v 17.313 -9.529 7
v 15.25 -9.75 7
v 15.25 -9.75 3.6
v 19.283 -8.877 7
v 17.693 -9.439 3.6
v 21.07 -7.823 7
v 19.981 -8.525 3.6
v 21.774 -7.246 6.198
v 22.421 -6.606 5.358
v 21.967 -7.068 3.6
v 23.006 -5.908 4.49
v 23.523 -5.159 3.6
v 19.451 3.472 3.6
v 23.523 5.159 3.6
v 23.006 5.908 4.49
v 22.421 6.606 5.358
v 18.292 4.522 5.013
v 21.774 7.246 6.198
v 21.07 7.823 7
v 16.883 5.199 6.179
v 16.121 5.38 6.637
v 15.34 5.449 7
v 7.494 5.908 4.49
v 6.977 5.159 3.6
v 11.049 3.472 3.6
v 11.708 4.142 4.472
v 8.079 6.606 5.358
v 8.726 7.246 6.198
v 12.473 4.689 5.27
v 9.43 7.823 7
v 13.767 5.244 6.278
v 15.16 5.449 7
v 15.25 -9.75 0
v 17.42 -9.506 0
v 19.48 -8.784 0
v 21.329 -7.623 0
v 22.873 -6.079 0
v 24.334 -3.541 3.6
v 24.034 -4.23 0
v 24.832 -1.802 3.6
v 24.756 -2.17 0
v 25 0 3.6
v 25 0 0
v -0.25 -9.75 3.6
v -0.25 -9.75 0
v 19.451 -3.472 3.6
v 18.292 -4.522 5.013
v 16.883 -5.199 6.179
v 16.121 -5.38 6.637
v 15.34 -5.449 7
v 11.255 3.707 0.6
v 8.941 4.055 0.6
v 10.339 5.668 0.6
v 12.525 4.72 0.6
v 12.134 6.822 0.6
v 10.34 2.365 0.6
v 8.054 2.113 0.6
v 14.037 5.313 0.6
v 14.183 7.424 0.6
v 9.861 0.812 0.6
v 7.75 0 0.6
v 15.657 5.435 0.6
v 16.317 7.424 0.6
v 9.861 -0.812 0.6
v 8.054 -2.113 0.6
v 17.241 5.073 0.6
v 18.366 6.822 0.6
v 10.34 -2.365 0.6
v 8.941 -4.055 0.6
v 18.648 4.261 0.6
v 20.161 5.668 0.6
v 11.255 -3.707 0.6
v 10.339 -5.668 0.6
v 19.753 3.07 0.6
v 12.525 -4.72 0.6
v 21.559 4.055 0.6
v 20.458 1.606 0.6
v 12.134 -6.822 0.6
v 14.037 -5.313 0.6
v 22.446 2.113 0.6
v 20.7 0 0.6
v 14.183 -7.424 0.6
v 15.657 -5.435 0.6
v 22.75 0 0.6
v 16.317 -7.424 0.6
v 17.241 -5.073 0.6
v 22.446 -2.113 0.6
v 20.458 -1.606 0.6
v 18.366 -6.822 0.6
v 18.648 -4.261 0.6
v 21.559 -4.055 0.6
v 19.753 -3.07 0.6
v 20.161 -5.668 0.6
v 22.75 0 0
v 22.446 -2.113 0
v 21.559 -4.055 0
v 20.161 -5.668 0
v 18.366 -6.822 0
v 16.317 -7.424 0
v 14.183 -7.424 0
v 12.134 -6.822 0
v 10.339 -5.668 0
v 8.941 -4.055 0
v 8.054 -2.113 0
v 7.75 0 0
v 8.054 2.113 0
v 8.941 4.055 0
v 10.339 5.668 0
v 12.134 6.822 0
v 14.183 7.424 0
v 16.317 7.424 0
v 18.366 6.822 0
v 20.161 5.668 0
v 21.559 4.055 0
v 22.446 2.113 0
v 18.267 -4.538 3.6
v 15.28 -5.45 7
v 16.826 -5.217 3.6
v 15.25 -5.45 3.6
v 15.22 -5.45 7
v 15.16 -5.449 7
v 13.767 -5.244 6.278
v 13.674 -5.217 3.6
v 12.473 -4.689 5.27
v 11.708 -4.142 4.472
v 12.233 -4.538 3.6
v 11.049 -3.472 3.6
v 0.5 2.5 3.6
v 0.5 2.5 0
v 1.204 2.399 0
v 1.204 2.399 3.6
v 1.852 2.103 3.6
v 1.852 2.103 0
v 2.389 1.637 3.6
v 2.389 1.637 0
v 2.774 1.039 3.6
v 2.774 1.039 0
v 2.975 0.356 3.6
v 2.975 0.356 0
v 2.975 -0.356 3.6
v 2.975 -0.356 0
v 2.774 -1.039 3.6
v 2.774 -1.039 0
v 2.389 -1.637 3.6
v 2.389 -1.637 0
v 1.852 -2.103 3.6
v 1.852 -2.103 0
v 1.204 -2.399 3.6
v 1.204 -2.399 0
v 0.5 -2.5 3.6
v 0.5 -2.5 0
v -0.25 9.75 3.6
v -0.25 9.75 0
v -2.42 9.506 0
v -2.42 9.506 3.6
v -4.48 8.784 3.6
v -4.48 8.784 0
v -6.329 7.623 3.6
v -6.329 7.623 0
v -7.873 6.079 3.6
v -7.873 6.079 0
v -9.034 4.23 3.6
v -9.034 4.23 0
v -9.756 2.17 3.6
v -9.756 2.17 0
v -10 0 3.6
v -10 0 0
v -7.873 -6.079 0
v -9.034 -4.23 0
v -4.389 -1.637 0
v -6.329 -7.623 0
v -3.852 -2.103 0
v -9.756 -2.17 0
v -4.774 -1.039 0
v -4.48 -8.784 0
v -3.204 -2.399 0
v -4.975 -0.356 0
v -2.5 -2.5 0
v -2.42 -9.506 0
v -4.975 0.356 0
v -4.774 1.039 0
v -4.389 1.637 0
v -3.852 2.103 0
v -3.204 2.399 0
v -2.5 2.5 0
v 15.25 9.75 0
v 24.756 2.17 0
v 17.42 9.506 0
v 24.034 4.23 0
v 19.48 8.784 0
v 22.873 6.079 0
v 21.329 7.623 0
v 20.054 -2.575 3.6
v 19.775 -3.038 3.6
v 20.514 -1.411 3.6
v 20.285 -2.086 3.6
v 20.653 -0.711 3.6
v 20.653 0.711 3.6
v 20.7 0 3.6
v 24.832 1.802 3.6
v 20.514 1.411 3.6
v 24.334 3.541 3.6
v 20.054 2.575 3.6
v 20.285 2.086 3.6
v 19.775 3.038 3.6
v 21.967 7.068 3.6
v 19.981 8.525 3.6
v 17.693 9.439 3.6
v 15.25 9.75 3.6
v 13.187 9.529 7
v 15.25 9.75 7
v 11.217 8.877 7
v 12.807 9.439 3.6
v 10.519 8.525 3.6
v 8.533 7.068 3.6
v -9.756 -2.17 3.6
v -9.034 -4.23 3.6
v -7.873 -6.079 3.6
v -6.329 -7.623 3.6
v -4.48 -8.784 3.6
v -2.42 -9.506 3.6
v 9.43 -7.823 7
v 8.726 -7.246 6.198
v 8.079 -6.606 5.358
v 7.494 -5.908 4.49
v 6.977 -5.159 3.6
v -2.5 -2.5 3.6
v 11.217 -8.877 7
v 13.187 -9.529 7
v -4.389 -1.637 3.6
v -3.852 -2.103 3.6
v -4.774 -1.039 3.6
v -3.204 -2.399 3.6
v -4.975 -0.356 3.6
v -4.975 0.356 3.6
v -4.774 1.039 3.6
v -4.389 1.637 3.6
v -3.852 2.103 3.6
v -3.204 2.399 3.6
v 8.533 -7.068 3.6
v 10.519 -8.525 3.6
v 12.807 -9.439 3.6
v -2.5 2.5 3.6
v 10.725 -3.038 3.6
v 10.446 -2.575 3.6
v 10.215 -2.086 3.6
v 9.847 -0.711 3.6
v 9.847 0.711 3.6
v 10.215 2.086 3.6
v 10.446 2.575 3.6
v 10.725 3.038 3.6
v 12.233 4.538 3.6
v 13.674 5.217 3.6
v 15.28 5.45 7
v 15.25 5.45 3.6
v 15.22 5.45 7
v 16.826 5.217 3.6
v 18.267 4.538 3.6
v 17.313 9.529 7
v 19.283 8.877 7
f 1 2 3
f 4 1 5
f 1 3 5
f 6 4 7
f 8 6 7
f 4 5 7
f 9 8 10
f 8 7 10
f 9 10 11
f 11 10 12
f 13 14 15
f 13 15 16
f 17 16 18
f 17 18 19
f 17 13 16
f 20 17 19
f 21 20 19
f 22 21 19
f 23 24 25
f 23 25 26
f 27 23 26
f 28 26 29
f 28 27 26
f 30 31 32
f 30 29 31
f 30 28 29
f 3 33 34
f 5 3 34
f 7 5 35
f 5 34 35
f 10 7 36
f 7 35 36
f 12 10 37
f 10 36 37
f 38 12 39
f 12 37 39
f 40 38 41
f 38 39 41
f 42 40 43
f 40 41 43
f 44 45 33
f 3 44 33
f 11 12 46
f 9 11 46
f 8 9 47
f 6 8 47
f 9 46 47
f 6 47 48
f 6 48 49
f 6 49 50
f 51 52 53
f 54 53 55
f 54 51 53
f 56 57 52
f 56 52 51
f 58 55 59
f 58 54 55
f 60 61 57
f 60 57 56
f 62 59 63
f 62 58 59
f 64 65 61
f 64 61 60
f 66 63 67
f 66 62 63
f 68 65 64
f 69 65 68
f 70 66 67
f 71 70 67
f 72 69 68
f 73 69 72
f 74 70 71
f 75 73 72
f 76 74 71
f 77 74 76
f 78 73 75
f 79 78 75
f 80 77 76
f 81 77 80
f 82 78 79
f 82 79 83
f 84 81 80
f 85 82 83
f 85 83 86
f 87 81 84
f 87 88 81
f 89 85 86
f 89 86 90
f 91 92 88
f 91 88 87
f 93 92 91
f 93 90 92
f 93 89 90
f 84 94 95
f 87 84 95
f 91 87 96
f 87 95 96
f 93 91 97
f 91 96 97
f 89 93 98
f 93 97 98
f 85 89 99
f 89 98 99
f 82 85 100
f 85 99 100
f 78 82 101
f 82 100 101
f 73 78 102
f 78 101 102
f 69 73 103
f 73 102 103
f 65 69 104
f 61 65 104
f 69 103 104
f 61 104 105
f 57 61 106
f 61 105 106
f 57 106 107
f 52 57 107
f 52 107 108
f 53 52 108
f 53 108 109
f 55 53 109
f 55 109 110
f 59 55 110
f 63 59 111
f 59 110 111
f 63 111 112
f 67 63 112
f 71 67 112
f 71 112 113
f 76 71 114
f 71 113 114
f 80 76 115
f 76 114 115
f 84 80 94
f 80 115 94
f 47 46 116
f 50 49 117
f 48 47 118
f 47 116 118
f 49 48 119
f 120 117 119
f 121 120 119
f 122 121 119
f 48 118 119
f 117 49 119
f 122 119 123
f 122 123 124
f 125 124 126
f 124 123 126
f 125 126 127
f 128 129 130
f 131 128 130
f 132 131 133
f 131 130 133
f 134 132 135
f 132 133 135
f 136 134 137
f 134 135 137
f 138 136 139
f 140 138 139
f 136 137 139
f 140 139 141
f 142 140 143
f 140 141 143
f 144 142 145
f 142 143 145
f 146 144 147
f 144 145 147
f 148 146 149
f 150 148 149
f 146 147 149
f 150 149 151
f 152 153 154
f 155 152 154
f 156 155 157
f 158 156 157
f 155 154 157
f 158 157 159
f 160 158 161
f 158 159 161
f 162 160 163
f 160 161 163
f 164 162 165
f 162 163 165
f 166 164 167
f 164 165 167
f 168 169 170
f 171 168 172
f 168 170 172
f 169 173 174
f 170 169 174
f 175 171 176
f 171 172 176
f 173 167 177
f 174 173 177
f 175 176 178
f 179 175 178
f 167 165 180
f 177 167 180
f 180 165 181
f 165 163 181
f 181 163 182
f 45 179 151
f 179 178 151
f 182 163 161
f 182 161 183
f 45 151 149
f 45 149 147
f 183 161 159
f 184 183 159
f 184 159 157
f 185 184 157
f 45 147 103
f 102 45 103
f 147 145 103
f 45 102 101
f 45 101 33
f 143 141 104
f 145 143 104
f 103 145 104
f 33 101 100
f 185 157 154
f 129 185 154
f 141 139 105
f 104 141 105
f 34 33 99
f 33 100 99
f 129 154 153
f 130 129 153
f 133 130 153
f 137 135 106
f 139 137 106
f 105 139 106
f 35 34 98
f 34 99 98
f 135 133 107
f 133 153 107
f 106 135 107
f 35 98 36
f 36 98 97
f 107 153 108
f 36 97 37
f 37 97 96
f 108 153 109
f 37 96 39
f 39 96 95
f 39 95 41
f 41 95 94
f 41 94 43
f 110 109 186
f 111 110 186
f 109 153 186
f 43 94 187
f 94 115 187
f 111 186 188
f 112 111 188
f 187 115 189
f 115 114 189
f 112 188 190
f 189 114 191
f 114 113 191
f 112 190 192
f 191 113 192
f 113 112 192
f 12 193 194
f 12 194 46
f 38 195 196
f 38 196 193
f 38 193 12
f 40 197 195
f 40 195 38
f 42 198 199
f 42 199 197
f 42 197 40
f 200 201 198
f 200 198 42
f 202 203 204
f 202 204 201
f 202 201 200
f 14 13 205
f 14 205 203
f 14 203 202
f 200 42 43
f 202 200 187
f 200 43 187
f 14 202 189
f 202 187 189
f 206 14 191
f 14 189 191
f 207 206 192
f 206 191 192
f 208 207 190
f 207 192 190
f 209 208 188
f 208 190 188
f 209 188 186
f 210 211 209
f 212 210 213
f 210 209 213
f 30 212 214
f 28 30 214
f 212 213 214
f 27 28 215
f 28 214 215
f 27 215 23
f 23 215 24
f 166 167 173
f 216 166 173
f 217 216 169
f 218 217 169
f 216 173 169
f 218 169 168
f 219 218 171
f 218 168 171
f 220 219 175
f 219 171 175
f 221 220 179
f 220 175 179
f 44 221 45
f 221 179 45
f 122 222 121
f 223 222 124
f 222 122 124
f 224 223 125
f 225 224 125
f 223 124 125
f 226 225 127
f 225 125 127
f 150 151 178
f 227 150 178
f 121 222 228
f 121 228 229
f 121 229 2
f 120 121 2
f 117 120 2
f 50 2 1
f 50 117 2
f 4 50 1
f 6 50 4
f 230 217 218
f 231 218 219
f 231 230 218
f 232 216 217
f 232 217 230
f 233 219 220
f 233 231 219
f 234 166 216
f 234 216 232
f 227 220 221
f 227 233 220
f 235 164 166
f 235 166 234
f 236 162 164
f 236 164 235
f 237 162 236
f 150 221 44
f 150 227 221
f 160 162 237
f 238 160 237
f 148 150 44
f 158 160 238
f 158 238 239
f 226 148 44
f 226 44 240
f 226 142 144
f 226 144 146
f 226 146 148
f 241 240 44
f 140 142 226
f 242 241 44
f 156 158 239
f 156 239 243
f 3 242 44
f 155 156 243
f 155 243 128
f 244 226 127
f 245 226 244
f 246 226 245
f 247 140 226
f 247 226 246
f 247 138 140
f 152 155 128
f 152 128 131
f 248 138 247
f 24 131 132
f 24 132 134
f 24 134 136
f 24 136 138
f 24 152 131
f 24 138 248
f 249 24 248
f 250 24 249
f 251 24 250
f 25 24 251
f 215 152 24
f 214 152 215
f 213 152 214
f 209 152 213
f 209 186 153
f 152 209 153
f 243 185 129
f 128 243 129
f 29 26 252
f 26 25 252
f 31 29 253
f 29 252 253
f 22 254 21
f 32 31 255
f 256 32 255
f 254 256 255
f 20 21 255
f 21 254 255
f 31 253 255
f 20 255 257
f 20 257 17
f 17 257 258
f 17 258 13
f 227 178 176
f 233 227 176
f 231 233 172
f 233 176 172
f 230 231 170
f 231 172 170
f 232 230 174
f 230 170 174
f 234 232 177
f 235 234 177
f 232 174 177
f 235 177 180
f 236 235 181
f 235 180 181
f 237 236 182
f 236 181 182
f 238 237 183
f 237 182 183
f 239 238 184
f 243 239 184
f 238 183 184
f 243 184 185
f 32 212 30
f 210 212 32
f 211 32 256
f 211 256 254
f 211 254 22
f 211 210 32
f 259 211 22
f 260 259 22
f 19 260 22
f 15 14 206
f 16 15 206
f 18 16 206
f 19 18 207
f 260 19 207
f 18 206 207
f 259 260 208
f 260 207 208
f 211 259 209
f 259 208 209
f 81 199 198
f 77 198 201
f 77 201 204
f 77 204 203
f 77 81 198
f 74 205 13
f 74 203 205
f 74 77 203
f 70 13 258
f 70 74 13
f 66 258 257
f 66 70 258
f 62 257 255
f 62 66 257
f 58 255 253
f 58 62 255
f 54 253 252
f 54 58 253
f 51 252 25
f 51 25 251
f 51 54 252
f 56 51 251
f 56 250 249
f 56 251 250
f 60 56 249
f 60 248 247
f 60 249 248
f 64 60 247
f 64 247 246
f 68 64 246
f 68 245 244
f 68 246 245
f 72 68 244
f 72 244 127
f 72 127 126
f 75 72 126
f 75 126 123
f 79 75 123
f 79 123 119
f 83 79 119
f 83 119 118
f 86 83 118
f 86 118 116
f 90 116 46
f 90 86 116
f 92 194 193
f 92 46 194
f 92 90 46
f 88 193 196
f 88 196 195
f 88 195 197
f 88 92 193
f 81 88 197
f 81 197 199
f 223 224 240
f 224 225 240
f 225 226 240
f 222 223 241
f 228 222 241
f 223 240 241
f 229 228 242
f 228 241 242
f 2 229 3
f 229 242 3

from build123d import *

# Parameters (mm, degrees)
F0_R        = 5.45
F1_DEPTH    = 3.6
F3_DEPTH    = 3.4
F4_T4_DEPTH = 30.0168298797
F5_T4_DEPTH = 28.3957620677
F6_T4_DEPTH = 30.0168298797
F7_T4_DEPTH = 28.3957620678
F8_R        = 7.5
F9_DEPTH    = 0.6


# Not quite as in the source:
# - a fillet or chamfer that OpenCascade refuses, or shapes differently, is made with other operations: its cross-section is extruded or revolved along the edge and cut away or added


with BuildPart() as f1:
    # F0 (on Top) → F1 (new body)
    with BuildSketch(Plane.XY):
        with BuildLine():
            Line((15.25, 9.75), (-0.25, 9.75))
            ThreePointArc((-0.25, 9.75), (-7.1442911166, 6.8942911166), (-10, 0))
            ThreePointArc((-10, 0), (-7.1442911166, -6.8942911166), (-0.25, -9.75))
            Line((-0.25, -9.75), (15.25, -9.75))
            ThreePointArc((15.25, -9.75), (22.1442911166, -6.8942911166), (25, 0))
            ThreePointArc((25, 0), (22.1442911166, 6.8942911166), (15.25, 9.75))
        make_face()
        with BuildLine():
            ThreePointArc((-2.5, -2.5), (-5, 0), (-2.5, 2.5))
            Line((-2.5, 2.5), (0.5, 2.5))
            ThreePointArc((0.5, 2.5), (3, 0), (0.5, -2.5))
            Line((0.5, -2.5), (-2.5, -2.5))
        make_face(mode=Mode.SUBTRACT)
        with Locations((15.25, 0)):
            Circle(F0_R, mode=Mode.SUBTRACT)
    extrude(amount=F1_DEPTH)

    # F2 (on face) → F3 (join)
    with BuildSketch(Plane.XY.offset(3.6)):
        with BuildLine():
            Line((6.242174558, 3.7311634656), (10.2148565478, 2.0856247064))
            ThreePointArc((10.2148565478, 2.0856247064), (15.25, 5.45), (20.2851434522, 2.0856247064))
            Line((20.2851434522, 2.0856247064), (24.257825442, 3.7311634656))
            ThreePointArc((24.257825442, 3.7311634656), (20.6668097719, 8.1068287199), (15.25, 9.75))
            ThreePointArc((15.25, 9.75), (9.8331902281, 8.1068287199), (6.242174558, 3.7311634656))
        make_face()
        with BuildLine():
            ThreePointArc((20.2851434522, -2.0856247064), (15.25, -5.45), (10.2148565478, -2.0856247064))
            Line((10.2148565478, -2.0856247064), (6.242174558, -3.7311634656))
            ThreePointArc((6.242174558, -3.7311634656), (9.8331902281, -8.1068287199), (15.25, -9.75))
            ThreePointArc((15.25, -9.75), (20.6668097719, -8.1068287199), (24.257825442, -3.7311634656))
            Line((24.257825442, -3.7311634656), (20.2851434522, -2.0856247064))
        make_face()
    extrude(amount=F3_DEPTH)

    # F4: chamfer of 5 on 1 edges, made by hand


with BuildPart() as f4_tool2:
    # F4_s3 → F4_t4 (new body)
    with BuildSketch(Plane(origin=(-7.8707626189, 3.260176623, 0), x_dir=(0, 0, 1), z_dir=(0.9238795325, -0.3826834324, 0))):
        Polygon((2, -5.8359223436), (7, -10.8359223436), (7, -5.8359223436), align=None)
    extrude(amount=F4_T4_DEPTH)

    split(bisect_by=Plane.XY.offset(3.6), keep=Keep.TOP)


with BuildPart() as f1_1:
    add(f1.part)

    # F4_t1: cut F4_tool2
    add(f4_tool2.part, mode=Mode.SUBTRACT)

    # F5: chamfer of 5 on 1 edges, made by hand


with BuildPart() as f5_tool2:
    # F5_s3 → F5_t4 (new body)
    with BuildSketch(Plane(origin=(7.6698776475, 3.1769673433, 0), x_dir=(0, 0, 1), z_dir=(0.9238795325, 0.3826834324, 0))):
        Polygon((2, 5.8359223436), (7, 0.8359223436), (7, 5.8359223436), align=None)
    extrude(amount=F5_T4_DEPTH)

    split(bisect_by=Plane.XY.offset(3.6), keep=Keep.TOP)


with BuildPart() as f1_2:
    add(f1_1.part)

    # F5_t1: cut F5_tool2
    add(f5_tool2.part, mode=Mode.SUBTRACT)

    # F6: chamfer of 5 on 1 edges, made by hand


with BuildPart() as f6_tool2:
    # F6_s3 → F6_t4 (new body)
    with BuildSketch(Plane(origin=(6.1722062753, -2.556611549, 0), x_dir=(0, 0, 1), z_dir=(0.9238795325, -0.3826834324, 0))):
        Polygon((2, -5.8359223436), (7, -0.8359223436), (7, -5.8359223436), align=None)
    extrude(amount=F6_T4_DEPTH)

    split(bisect_by=Plane.XY.offset(3.6), keep=Keep.TOP)


with BuildPart() as f1_3:
    add(f1_2.part)

    # F6_t1: cut F6_tool2
    add(f6_tool2.part, mode=Mode.SUBTRACT)

    # F7: chamfer of 5 on 1 edges, made by hand


with BuildPart() as f7_tool2:
    # F7_s3 → F7_t4 (new body)
    with BuildSketch(Plane(origin=(18.3635007657, 7.6064110698, 0), x_dir=(0, 0, 1), z_dir=(-0.9238795325, -0.3826834324, 0))):
        Polygon((7, -10.8359223436), (2, -5.8359223436), (7, -5.8359223436), align=None)
    extrude(amount=F7_T4_DEPTH)

    split(bisect_by=Plane.XY.offset(3.6), keep=Keep.TOP)


with BuildPart() as f1_4:
    add(f1_3.part)

    # F7_t1: cut F7_tool2
    add(f7_tool2.part, mode=Mode.SUBTRACT)

    # F8 (on face) → F9 (cut)
    with BuildSketch(Plane(origin=(0, 0, 0), x_dir=(1, 0, 0), z_dir=(0, 0, -1))):
        with Locations((15.25, 0)):
            Circle(F8_R)
    extrude(amount=-F9_DEPTH, mode=Mode.SUBTRACT)


solid = f1_4.part
